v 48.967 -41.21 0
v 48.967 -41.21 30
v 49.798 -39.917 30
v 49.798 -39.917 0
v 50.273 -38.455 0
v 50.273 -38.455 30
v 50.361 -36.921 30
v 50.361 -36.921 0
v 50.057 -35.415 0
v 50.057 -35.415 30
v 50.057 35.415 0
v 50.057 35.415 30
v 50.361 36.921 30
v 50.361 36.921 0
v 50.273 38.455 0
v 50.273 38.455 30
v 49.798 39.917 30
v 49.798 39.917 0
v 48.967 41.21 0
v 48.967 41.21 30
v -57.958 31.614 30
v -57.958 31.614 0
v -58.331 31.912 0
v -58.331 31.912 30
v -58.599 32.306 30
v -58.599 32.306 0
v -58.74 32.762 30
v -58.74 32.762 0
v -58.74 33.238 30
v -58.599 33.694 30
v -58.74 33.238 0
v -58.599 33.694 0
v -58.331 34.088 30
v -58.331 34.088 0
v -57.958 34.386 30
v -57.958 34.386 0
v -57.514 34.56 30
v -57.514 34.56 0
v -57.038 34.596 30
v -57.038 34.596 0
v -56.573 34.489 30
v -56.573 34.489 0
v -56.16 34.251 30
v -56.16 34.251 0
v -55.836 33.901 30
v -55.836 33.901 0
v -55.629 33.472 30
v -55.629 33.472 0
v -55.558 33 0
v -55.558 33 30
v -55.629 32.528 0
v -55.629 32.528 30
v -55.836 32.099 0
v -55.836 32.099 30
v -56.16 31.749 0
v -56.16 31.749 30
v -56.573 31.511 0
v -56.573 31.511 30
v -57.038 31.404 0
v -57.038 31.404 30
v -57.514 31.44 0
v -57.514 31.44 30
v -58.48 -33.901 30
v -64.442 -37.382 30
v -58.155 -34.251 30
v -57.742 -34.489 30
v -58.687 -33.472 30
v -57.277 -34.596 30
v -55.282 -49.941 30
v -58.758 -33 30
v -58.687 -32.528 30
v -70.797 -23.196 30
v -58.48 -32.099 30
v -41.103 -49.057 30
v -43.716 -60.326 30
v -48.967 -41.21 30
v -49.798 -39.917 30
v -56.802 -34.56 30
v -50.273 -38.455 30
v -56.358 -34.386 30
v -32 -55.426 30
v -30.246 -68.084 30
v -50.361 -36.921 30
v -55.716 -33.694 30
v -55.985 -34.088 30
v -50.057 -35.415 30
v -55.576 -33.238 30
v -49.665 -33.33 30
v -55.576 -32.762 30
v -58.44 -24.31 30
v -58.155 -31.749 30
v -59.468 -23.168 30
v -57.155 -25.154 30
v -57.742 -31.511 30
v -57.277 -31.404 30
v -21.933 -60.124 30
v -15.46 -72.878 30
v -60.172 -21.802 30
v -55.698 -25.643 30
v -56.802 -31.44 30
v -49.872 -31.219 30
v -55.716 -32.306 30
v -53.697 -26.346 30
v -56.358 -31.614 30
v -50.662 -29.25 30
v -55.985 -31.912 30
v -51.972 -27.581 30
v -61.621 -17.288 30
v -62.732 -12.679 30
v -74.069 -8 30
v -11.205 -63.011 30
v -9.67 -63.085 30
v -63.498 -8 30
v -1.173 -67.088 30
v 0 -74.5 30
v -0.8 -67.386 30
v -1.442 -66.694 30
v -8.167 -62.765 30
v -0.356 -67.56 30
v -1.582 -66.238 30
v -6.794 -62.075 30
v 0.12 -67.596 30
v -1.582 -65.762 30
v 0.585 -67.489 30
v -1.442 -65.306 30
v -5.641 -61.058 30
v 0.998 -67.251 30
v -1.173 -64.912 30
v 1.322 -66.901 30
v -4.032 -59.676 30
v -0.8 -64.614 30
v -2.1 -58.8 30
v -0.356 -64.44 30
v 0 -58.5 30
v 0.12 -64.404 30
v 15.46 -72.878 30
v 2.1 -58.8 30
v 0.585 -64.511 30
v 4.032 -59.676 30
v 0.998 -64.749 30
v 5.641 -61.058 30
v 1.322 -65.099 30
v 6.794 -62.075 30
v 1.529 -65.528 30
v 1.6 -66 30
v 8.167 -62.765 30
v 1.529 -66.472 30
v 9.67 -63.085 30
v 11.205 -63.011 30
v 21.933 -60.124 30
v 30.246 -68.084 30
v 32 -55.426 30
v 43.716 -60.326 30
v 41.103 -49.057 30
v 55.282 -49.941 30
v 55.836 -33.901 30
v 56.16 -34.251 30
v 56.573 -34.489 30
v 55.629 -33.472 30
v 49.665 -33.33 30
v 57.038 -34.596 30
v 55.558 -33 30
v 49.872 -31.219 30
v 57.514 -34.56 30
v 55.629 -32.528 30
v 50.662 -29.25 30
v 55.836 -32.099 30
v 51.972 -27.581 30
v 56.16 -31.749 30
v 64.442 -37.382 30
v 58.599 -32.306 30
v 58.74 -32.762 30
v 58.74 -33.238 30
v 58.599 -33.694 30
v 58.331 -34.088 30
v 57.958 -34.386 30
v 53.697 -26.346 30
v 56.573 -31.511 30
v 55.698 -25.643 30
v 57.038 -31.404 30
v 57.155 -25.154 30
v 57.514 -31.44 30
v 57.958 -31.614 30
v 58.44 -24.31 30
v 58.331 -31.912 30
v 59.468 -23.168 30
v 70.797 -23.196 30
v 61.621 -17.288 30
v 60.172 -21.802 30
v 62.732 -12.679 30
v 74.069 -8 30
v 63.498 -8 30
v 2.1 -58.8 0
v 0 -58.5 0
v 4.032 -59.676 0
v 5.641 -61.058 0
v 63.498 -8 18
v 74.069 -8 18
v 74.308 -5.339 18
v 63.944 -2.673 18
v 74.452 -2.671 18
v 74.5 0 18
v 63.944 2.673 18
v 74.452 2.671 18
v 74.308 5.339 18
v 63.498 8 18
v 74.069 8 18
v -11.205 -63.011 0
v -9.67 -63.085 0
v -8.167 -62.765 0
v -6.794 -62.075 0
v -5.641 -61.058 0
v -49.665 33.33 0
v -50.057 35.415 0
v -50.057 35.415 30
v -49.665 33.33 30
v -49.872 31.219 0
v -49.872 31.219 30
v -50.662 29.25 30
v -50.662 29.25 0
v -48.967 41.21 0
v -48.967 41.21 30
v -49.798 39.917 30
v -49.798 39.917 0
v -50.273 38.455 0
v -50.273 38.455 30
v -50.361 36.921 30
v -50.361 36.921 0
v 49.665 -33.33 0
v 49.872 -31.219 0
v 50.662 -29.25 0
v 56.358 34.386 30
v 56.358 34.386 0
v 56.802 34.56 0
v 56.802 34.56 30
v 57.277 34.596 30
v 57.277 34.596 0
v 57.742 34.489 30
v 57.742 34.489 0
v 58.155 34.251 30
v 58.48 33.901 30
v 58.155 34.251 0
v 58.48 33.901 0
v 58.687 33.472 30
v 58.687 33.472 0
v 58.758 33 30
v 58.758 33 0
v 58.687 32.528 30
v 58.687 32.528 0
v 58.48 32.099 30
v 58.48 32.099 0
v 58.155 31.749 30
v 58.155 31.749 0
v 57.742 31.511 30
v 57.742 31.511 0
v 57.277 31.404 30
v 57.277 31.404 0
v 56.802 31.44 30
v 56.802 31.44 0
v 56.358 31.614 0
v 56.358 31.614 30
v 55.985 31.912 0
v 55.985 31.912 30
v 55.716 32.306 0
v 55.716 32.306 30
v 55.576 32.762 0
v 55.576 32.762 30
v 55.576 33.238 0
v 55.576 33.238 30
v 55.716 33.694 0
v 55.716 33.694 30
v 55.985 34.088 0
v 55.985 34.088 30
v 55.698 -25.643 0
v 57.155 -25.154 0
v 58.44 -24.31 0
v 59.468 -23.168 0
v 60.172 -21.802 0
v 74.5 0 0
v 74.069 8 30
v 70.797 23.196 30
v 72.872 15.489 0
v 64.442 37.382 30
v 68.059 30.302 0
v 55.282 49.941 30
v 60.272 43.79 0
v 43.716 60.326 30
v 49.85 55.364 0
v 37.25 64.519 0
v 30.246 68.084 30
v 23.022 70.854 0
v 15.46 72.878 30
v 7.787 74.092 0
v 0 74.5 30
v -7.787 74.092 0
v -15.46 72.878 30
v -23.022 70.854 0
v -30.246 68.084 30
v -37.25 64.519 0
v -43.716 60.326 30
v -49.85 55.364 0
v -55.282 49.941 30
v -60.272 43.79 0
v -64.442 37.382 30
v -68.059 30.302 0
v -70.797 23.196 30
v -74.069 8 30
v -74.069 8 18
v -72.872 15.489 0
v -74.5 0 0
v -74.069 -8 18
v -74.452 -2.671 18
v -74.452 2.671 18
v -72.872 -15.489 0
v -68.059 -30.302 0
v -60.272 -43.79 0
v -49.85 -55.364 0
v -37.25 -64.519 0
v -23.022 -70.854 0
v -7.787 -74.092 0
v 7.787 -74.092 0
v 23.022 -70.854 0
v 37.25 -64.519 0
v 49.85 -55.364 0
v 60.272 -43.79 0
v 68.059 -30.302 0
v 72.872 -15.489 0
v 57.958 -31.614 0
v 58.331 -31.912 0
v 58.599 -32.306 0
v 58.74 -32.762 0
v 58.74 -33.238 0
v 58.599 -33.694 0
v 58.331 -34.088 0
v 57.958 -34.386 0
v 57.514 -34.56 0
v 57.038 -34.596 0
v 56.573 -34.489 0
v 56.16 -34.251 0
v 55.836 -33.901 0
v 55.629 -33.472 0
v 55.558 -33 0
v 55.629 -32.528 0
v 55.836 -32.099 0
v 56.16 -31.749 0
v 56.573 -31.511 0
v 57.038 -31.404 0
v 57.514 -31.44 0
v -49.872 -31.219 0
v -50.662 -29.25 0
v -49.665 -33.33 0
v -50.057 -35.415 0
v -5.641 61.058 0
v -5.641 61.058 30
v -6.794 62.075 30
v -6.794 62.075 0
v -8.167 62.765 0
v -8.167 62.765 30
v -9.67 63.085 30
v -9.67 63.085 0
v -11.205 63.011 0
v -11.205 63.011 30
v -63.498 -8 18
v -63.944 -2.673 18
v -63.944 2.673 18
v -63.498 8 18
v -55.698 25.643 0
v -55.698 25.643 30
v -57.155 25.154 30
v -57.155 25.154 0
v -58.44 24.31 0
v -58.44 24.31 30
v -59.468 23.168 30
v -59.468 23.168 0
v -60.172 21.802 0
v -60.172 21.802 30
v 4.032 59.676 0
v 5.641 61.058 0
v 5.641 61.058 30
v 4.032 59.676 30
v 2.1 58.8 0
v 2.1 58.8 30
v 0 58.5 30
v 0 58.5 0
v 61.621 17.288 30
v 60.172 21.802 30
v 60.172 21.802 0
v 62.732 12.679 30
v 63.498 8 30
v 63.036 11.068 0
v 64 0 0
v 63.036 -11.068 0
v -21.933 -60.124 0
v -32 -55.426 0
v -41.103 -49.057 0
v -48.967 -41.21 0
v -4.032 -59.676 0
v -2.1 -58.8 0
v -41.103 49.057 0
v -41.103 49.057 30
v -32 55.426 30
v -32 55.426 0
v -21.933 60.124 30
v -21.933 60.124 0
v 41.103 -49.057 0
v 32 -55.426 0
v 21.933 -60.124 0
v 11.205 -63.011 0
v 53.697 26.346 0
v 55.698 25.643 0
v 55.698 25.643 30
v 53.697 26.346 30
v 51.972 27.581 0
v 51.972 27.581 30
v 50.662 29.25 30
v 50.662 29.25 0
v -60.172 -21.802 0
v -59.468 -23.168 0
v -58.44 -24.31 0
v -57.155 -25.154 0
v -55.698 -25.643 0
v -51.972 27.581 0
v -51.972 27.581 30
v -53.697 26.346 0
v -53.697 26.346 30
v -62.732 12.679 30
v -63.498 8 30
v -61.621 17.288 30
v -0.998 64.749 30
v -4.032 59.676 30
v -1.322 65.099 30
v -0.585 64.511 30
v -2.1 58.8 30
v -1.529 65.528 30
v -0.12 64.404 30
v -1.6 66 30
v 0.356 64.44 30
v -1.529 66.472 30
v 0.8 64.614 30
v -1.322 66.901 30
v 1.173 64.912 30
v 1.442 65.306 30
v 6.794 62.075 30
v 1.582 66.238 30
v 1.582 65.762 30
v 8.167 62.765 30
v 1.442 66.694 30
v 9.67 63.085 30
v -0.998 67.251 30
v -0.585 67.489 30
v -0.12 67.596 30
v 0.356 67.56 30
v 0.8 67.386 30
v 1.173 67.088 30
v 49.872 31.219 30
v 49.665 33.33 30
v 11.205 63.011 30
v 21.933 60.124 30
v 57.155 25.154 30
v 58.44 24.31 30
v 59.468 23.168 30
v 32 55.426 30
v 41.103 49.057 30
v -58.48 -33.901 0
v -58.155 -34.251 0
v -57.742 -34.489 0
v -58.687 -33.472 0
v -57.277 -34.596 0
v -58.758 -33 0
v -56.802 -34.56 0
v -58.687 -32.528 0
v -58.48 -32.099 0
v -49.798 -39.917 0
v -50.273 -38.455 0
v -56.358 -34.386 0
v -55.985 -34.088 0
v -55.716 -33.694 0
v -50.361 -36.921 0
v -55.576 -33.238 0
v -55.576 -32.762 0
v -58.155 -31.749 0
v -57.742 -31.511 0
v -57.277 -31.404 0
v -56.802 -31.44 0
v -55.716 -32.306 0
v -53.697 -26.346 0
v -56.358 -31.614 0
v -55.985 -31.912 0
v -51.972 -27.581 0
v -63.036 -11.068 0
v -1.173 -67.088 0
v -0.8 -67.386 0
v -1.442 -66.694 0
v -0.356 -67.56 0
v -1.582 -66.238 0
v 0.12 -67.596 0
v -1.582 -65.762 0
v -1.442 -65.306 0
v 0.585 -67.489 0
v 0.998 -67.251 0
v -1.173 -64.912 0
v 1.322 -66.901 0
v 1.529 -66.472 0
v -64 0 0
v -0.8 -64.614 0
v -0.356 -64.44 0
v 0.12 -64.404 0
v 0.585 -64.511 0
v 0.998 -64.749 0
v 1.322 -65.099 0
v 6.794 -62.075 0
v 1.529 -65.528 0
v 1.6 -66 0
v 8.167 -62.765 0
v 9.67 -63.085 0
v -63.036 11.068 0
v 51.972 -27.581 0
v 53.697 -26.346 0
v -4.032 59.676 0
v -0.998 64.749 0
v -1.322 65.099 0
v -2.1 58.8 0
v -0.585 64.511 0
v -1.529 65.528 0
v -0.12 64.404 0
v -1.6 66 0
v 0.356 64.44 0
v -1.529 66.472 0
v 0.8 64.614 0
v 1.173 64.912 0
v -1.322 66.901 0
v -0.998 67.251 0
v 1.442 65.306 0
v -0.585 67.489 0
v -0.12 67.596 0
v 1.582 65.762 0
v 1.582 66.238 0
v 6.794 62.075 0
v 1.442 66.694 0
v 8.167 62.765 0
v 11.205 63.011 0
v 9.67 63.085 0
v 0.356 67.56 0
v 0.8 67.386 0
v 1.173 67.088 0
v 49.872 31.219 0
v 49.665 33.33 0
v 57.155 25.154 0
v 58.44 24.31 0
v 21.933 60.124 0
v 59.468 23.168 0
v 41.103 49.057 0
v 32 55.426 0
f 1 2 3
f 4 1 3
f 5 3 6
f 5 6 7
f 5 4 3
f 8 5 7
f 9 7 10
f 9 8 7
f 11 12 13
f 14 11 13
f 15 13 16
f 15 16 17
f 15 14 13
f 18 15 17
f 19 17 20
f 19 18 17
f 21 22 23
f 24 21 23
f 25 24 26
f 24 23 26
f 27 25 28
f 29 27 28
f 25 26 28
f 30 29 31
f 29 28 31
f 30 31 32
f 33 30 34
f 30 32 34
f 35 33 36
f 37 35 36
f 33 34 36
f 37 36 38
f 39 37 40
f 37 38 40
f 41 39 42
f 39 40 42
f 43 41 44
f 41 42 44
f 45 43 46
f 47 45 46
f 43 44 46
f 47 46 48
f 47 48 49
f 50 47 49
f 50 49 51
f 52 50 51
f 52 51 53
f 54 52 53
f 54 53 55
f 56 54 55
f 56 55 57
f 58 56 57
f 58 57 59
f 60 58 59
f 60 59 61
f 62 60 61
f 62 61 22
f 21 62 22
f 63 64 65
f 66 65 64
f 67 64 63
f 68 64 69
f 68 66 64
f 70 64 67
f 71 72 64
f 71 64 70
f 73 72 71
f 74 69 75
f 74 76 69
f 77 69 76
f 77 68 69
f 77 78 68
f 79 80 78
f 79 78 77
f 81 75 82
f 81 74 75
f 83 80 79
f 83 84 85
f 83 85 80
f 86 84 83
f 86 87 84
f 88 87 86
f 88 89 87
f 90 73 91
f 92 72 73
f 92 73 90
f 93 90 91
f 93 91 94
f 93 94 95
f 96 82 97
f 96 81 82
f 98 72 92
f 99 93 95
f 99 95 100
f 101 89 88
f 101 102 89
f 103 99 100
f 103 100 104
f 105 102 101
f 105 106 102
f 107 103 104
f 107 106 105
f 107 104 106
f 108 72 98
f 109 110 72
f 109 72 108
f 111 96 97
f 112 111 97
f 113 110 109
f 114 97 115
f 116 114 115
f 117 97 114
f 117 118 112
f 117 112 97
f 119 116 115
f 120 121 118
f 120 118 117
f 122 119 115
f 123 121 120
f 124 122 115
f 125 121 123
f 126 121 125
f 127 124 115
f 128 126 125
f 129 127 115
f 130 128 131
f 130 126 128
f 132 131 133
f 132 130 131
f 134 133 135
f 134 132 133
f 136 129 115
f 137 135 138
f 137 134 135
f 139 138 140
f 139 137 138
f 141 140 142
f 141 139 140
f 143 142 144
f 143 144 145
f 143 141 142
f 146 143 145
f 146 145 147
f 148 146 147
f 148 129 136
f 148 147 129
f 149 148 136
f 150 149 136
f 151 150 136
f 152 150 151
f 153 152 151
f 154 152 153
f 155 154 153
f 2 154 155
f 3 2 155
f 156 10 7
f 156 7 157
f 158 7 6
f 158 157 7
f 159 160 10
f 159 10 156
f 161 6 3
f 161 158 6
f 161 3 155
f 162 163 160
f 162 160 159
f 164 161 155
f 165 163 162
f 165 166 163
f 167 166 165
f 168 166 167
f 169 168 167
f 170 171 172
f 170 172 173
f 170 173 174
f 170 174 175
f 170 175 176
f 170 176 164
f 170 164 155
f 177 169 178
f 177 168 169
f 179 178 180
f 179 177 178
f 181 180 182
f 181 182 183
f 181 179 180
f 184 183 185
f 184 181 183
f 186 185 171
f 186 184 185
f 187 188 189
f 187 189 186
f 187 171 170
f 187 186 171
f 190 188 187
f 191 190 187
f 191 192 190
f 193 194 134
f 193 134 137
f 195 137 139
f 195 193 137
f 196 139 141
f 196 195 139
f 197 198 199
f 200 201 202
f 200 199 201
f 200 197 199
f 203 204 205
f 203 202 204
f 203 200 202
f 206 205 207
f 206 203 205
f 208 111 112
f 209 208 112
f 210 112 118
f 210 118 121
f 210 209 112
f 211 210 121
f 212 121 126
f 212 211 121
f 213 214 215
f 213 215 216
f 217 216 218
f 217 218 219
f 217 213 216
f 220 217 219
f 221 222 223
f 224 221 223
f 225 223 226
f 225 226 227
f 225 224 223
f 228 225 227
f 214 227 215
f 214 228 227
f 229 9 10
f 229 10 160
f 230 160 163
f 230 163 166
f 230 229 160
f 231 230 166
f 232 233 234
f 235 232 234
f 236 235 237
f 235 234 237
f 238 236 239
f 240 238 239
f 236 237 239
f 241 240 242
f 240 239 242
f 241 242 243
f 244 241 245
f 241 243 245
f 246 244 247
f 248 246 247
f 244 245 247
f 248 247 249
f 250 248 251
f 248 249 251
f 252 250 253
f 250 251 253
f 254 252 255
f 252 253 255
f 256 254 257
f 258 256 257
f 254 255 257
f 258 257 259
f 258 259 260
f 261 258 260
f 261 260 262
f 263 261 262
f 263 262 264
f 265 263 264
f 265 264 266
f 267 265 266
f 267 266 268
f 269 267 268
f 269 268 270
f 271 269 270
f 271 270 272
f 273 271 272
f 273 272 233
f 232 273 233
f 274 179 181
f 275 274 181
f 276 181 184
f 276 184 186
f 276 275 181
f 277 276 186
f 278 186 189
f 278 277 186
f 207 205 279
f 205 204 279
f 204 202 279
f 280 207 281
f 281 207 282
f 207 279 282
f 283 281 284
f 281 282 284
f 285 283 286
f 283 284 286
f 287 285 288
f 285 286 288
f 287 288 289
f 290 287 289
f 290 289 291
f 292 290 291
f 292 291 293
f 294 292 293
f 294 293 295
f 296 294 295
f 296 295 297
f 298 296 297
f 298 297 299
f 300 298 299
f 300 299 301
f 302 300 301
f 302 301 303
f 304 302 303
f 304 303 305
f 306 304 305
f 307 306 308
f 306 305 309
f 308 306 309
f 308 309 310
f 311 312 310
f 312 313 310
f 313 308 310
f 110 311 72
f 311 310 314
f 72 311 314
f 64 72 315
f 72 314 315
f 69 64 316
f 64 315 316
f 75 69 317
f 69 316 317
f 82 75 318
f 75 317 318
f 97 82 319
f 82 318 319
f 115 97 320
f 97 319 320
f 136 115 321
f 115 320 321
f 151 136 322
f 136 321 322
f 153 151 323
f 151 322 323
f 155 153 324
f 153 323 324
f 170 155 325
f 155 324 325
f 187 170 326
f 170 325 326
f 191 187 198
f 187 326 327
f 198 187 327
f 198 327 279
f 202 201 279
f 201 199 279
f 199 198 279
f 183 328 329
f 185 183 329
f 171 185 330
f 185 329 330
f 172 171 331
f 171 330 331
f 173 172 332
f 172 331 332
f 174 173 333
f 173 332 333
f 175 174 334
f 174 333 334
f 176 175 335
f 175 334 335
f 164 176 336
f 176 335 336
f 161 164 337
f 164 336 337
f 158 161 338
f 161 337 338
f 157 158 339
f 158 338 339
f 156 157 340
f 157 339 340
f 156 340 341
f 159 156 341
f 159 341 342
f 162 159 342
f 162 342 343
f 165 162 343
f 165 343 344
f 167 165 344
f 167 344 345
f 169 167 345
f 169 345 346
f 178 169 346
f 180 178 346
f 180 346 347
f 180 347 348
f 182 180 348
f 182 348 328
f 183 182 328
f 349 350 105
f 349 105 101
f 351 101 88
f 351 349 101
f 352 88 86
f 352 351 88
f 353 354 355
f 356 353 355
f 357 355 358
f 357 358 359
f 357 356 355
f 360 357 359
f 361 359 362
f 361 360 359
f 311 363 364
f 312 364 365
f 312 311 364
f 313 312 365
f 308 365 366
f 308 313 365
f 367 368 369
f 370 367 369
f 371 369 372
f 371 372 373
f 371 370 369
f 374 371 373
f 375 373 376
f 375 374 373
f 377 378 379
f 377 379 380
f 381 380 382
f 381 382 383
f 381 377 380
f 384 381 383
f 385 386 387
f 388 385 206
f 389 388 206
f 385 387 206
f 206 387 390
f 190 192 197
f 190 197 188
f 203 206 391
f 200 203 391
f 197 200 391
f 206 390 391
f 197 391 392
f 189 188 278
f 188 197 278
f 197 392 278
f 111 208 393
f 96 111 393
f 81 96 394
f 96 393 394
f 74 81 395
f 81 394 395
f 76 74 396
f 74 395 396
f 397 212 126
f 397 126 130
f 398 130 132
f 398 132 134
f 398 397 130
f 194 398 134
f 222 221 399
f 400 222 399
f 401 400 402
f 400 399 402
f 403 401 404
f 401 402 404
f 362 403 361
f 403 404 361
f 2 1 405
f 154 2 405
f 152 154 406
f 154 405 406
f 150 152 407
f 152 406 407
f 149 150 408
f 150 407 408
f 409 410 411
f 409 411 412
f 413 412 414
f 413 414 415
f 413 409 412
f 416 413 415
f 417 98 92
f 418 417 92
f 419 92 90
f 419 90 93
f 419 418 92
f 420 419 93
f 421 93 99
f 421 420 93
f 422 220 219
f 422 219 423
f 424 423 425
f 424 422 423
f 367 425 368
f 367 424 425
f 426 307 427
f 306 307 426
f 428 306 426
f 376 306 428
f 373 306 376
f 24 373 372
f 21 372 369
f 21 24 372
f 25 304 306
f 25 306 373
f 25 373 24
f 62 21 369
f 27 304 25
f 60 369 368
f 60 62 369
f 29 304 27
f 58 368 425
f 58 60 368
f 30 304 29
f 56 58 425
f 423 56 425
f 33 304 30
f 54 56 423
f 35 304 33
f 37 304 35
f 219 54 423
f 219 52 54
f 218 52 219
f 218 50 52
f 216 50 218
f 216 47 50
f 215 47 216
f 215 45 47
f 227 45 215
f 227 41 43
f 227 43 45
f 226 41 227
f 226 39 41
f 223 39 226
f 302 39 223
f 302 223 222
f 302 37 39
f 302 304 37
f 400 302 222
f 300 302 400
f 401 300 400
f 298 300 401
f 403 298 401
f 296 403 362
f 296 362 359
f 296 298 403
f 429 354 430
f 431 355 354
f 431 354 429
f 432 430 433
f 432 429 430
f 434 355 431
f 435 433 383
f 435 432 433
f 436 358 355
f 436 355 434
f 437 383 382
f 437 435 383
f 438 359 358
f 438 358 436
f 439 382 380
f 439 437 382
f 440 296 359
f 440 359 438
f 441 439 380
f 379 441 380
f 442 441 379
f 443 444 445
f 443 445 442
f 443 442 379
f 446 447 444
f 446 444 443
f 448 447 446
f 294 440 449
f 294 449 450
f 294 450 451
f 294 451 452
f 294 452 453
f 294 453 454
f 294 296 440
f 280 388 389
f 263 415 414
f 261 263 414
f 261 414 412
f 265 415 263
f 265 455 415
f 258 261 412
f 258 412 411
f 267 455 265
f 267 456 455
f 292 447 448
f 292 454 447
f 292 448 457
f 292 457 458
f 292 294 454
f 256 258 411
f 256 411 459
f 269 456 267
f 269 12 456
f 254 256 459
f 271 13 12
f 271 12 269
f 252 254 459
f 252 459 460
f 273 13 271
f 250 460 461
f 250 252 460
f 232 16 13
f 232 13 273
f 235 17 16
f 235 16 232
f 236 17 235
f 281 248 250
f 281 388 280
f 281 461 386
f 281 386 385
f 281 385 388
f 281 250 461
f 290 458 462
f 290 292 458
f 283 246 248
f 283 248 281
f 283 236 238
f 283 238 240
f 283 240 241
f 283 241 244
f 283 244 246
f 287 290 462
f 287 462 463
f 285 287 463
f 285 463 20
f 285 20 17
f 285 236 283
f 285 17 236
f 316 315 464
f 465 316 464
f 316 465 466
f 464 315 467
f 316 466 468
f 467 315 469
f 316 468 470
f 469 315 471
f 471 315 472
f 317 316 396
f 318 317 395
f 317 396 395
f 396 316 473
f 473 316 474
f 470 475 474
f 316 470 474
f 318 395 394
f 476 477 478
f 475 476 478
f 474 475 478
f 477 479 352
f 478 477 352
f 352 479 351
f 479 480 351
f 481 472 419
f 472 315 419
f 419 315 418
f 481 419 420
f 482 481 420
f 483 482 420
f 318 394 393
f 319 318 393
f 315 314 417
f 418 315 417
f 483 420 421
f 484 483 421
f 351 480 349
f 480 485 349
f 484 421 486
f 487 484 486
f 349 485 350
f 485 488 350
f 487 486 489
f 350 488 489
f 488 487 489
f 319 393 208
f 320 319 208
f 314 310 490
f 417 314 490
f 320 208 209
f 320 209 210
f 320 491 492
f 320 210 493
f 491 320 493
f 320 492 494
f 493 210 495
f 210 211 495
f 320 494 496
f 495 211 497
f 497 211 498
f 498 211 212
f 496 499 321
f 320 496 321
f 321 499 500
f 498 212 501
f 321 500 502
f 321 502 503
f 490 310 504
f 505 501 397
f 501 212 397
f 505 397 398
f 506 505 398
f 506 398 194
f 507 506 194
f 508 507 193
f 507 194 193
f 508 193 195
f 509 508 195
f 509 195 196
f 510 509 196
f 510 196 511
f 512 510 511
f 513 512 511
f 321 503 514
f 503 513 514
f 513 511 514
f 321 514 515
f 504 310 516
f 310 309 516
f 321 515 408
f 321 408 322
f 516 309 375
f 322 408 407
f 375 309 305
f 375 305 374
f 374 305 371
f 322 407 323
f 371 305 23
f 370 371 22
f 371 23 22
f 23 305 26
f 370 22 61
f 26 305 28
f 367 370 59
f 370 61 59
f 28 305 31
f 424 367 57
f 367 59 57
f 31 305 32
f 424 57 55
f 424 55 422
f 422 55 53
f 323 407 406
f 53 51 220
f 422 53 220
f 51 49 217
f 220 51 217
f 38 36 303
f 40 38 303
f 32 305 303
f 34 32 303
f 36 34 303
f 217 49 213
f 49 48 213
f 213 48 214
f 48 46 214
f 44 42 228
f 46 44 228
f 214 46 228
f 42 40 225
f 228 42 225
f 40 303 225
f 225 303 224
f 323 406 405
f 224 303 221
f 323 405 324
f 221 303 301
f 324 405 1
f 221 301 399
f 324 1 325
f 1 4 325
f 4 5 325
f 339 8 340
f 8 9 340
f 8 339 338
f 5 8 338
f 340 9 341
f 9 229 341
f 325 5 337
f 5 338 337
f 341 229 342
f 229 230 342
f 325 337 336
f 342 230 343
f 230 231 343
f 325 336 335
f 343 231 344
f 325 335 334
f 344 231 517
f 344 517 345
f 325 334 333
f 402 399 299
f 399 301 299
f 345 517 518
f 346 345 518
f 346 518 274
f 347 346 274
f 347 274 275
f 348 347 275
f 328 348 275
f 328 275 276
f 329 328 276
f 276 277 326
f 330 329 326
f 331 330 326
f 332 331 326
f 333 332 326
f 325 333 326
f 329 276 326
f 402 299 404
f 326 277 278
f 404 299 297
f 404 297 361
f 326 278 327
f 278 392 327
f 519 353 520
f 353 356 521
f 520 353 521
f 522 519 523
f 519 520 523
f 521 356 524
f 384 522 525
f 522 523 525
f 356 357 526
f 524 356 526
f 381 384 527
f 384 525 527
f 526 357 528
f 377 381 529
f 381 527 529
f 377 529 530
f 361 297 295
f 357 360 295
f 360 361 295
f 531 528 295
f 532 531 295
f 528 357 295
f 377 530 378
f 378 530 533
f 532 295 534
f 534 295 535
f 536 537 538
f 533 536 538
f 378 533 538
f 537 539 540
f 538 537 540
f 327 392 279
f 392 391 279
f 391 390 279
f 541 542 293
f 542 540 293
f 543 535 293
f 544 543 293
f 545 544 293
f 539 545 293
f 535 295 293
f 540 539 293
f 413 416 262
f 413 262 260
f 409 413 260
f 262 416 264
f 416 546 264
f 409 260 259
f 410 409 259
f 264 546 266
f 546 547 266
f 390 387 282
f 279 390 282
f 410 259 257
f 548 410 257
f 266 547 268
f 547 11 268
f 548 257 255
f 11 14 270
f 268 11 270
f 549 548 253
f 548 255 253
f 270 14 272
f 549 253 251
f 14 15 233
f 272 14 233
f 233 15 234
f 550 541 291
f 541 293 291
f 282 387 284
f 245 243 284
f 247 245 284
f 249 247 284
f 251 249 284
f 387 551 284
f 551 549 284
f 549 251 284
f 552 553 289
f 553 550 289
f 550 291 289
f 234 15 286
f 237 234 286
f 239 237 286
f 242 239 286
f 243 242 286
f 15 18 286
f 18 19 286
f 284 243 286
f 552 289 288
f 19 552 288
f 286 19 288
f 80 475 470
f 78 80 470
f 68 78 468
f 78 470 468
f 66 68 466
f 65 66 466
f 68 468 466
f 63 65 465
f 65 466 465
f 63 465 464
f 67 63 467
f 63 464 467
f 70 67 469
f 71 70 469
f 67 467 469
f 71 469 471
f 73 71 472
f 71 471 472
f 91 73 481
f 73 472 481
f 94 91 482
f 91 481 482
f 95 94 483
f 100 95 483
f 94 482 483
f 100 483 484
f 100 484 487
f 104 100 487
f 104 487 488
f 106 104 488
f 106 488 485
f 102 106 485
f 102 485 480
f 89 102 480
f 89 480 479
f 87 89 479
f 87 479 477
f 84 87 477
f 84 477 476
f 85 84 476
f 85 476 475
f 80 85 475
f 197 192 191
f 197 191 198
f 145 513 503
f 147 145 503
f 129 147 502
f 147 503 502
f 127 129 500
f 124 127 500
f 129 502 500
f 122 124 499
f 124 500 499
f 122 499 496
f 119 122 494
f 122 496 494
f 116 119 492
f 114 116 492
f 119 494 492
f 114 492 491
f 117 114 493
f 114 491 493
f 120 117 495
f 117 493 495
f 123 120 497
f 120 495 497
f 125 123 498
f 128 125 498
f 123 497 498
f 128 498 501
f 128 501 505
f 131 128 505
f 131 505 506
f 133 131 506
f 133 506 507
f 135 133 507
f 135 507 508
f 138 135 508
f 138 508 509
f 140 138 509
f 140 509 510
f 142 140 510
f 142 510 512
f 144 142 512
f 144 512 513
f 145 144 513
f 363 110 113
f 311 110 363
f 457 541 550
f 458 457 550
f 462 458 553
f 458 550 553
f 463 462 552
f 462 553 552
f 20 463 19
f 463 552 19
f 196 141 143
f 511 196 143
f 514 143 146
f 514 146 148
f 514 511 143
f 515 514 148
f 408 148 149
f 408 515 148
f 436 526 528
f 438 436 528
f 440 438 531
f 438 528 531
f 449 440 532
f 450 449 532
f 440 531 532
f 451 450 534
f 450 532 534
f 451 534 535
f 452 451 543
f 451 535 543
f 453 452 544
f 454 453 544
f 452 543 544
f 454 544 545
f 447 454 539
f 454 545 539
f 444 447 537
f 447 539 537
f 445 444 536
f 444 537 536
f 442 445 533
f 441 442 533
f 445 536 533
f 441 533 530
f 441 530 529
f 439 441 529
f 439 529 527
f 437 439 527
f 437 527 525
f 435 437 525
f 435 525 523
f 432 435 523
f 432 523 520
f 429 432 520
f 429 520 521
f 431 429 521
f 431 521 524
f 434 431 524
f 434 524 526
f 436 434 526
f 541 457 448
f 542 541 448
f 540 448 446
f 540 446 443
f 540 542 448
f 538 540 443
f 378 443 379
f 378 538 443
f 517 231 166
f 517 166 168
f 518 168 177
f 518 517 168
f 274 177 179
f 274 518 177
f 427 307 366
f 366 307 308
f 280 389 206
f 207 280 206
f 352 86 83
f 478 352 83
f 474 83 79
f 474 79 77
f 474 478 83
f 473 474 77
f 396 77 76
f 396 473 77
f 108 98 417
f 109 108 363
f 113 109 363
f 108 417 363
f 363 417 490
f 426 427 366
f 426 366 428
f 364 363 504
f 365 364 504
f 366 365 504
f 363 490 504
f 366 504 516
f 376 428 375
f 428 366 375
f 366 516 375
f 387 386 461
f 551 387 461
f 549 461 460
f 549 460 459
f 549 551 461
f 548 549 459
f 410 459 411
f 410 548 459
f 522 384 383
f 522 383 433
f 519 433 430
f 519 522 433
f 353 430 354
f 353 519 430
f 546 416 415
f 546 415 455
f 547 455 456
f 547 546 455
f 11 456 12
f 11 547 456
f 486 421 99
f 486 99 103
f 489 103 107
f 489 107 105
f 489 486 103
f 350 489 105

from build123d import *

# Parameters (mm, degrees)
ESQUISSE1_R                  = 74.5
BOSS_EXTRU_1_DEPTH           = 30
ESQUISSE3_R                  = 64
ENL_V_MAT_EXTRU_1_DEPTH      = 110.546793655
BOSS_EXTRU_2_DEPTH           = 30
ESQUISSE5_R                  = 1.6
ENL_V_MAT_EXTRU_2_DEPTH      = 120
R_P_TITION_CIRCULAIRE1_COUNT = 6
ENL_V_MAT_EXTRU_3_DEPTH      = 110.546793655
ENL_V_MAT_EXTRU_3_DEPTH_BACK = 110.546793655
ESQUISSE7_W                  = 12
ESQUISSE7_H                  = 16


with BuildPart() as part:
    # Esquisse1 → Boss.-Extru.1 (new body)
    with BuildSketch(Plane.XY):
        Circle(ESQUISSE1_R)
    extrude(amount=BOSS_EXTRU_1_DEPTH)

    # Esquisse3 → Enlèv. mat.-Extru.1 (cut, through all)
    with BuildSketch(Plane(origin=(0, 0, 0), x_dir=(-1, 0, 0), z_dir=(0, 0, -1))):
        Circle(ESQUISSE3_R)
    extrude(amount=-ENL_V_MAT_EXTRU_1_DEPTH, mode=Mode.SUBTRACT)

    # Esquisse4 → Boss.-Extru.2 (add)
    with BuildSketch(Plane(origin=(0, 0, 0), x_dir=(-1, 0, 0), z_dir=(0, 0, -1))):
        with BuildLine():
            ThreePointArc((-11.204980679, 63.011494253), (-8.166638415, 62.765293029), (-5.641396522, 61.05787037))
            ThreePointArc((-5.641396522, 61.05787037), (-3.097097656, 59.169334871), (0, 58.5))
            ThreePointArc((0, 58.5), (3.097097656, 59.169334871), (5.641396522, 61.05787037))
            ThreePointArc((5.641396522, 61.05787037), (8.166638415, 62.765293029), (11.204980679, 63.011494253))
            ThreePointArc((11.204980679, 63.011494253), (0, 64), (-11.204980679, 63.011494253))
        make_face()
    boss_extru_2 = extrude(amount=-BOSS_EXTRU_2_DEPTH)

    # Esquisse5 → Enlèv. mat.-Extru.2 (cut)
    with BuildSketch(Plane(origin=(0, 0, 0), x_dir=(-1, 0, 0), z_dir=(0, 0, -1))):
        with Locations((0, 66)):
            Circle(ESQUISSE5_R)
    enl_v_mat_extru_2 = extrude(amount=-ENL_V_MAT_EXTRU_2_DEPTH, mode=Mode.SUBTRACT)

    # Répétition circulaire1: Boss.-Extru.2, Enlèv. mat.-Extru.2 ×6 about axis
    r_p_tition_circulaire1_axis = Axis((0, 0, 0), (0, 0, 1))
    add([boss_extru_2.rotate(r_p_tition_circulaire1_axis, i * 360 / R_P_TITION_CIRCULAIRE1_COUNT) for i in range(1, R_P_TITION_CIRCULAIRE1_COUNT)])
    add([enl_v_mat_extru_2.rotate(r_p_tition_circulaire1_axis, i * 360 / R_P_TITION_CIRCULAIRE1_COUNT) for i in range(1, R_P_TITION_CIRCULAIRE1_COUNT)], mode=Mode.SUBTRACT)

    # Esquisse7 → Enlèv. mat.-Extru.3 (cut, two sides: drawn at the far end of the back side and taken through both)
    with BuildSketch(Plane(origin=(0, 0, 0), x_dir=(0, 0, -1), z_dir=(1, 0, 0)).offset(-ENL_V_MAT_EXTRU_3_DEPTH_BACK)):
        with Locations((-24, 0)):
            Rectangle(ESQUISSE7_W, ESQUISSE7_H)
    extrude(amount=ENL_V_MAT_EXTRU_3_DEPTH + ENL_V_MAT_EXTRU_3_DEPTH_BACK, mode=Mode.SUBTRACT)


solid = part.part
